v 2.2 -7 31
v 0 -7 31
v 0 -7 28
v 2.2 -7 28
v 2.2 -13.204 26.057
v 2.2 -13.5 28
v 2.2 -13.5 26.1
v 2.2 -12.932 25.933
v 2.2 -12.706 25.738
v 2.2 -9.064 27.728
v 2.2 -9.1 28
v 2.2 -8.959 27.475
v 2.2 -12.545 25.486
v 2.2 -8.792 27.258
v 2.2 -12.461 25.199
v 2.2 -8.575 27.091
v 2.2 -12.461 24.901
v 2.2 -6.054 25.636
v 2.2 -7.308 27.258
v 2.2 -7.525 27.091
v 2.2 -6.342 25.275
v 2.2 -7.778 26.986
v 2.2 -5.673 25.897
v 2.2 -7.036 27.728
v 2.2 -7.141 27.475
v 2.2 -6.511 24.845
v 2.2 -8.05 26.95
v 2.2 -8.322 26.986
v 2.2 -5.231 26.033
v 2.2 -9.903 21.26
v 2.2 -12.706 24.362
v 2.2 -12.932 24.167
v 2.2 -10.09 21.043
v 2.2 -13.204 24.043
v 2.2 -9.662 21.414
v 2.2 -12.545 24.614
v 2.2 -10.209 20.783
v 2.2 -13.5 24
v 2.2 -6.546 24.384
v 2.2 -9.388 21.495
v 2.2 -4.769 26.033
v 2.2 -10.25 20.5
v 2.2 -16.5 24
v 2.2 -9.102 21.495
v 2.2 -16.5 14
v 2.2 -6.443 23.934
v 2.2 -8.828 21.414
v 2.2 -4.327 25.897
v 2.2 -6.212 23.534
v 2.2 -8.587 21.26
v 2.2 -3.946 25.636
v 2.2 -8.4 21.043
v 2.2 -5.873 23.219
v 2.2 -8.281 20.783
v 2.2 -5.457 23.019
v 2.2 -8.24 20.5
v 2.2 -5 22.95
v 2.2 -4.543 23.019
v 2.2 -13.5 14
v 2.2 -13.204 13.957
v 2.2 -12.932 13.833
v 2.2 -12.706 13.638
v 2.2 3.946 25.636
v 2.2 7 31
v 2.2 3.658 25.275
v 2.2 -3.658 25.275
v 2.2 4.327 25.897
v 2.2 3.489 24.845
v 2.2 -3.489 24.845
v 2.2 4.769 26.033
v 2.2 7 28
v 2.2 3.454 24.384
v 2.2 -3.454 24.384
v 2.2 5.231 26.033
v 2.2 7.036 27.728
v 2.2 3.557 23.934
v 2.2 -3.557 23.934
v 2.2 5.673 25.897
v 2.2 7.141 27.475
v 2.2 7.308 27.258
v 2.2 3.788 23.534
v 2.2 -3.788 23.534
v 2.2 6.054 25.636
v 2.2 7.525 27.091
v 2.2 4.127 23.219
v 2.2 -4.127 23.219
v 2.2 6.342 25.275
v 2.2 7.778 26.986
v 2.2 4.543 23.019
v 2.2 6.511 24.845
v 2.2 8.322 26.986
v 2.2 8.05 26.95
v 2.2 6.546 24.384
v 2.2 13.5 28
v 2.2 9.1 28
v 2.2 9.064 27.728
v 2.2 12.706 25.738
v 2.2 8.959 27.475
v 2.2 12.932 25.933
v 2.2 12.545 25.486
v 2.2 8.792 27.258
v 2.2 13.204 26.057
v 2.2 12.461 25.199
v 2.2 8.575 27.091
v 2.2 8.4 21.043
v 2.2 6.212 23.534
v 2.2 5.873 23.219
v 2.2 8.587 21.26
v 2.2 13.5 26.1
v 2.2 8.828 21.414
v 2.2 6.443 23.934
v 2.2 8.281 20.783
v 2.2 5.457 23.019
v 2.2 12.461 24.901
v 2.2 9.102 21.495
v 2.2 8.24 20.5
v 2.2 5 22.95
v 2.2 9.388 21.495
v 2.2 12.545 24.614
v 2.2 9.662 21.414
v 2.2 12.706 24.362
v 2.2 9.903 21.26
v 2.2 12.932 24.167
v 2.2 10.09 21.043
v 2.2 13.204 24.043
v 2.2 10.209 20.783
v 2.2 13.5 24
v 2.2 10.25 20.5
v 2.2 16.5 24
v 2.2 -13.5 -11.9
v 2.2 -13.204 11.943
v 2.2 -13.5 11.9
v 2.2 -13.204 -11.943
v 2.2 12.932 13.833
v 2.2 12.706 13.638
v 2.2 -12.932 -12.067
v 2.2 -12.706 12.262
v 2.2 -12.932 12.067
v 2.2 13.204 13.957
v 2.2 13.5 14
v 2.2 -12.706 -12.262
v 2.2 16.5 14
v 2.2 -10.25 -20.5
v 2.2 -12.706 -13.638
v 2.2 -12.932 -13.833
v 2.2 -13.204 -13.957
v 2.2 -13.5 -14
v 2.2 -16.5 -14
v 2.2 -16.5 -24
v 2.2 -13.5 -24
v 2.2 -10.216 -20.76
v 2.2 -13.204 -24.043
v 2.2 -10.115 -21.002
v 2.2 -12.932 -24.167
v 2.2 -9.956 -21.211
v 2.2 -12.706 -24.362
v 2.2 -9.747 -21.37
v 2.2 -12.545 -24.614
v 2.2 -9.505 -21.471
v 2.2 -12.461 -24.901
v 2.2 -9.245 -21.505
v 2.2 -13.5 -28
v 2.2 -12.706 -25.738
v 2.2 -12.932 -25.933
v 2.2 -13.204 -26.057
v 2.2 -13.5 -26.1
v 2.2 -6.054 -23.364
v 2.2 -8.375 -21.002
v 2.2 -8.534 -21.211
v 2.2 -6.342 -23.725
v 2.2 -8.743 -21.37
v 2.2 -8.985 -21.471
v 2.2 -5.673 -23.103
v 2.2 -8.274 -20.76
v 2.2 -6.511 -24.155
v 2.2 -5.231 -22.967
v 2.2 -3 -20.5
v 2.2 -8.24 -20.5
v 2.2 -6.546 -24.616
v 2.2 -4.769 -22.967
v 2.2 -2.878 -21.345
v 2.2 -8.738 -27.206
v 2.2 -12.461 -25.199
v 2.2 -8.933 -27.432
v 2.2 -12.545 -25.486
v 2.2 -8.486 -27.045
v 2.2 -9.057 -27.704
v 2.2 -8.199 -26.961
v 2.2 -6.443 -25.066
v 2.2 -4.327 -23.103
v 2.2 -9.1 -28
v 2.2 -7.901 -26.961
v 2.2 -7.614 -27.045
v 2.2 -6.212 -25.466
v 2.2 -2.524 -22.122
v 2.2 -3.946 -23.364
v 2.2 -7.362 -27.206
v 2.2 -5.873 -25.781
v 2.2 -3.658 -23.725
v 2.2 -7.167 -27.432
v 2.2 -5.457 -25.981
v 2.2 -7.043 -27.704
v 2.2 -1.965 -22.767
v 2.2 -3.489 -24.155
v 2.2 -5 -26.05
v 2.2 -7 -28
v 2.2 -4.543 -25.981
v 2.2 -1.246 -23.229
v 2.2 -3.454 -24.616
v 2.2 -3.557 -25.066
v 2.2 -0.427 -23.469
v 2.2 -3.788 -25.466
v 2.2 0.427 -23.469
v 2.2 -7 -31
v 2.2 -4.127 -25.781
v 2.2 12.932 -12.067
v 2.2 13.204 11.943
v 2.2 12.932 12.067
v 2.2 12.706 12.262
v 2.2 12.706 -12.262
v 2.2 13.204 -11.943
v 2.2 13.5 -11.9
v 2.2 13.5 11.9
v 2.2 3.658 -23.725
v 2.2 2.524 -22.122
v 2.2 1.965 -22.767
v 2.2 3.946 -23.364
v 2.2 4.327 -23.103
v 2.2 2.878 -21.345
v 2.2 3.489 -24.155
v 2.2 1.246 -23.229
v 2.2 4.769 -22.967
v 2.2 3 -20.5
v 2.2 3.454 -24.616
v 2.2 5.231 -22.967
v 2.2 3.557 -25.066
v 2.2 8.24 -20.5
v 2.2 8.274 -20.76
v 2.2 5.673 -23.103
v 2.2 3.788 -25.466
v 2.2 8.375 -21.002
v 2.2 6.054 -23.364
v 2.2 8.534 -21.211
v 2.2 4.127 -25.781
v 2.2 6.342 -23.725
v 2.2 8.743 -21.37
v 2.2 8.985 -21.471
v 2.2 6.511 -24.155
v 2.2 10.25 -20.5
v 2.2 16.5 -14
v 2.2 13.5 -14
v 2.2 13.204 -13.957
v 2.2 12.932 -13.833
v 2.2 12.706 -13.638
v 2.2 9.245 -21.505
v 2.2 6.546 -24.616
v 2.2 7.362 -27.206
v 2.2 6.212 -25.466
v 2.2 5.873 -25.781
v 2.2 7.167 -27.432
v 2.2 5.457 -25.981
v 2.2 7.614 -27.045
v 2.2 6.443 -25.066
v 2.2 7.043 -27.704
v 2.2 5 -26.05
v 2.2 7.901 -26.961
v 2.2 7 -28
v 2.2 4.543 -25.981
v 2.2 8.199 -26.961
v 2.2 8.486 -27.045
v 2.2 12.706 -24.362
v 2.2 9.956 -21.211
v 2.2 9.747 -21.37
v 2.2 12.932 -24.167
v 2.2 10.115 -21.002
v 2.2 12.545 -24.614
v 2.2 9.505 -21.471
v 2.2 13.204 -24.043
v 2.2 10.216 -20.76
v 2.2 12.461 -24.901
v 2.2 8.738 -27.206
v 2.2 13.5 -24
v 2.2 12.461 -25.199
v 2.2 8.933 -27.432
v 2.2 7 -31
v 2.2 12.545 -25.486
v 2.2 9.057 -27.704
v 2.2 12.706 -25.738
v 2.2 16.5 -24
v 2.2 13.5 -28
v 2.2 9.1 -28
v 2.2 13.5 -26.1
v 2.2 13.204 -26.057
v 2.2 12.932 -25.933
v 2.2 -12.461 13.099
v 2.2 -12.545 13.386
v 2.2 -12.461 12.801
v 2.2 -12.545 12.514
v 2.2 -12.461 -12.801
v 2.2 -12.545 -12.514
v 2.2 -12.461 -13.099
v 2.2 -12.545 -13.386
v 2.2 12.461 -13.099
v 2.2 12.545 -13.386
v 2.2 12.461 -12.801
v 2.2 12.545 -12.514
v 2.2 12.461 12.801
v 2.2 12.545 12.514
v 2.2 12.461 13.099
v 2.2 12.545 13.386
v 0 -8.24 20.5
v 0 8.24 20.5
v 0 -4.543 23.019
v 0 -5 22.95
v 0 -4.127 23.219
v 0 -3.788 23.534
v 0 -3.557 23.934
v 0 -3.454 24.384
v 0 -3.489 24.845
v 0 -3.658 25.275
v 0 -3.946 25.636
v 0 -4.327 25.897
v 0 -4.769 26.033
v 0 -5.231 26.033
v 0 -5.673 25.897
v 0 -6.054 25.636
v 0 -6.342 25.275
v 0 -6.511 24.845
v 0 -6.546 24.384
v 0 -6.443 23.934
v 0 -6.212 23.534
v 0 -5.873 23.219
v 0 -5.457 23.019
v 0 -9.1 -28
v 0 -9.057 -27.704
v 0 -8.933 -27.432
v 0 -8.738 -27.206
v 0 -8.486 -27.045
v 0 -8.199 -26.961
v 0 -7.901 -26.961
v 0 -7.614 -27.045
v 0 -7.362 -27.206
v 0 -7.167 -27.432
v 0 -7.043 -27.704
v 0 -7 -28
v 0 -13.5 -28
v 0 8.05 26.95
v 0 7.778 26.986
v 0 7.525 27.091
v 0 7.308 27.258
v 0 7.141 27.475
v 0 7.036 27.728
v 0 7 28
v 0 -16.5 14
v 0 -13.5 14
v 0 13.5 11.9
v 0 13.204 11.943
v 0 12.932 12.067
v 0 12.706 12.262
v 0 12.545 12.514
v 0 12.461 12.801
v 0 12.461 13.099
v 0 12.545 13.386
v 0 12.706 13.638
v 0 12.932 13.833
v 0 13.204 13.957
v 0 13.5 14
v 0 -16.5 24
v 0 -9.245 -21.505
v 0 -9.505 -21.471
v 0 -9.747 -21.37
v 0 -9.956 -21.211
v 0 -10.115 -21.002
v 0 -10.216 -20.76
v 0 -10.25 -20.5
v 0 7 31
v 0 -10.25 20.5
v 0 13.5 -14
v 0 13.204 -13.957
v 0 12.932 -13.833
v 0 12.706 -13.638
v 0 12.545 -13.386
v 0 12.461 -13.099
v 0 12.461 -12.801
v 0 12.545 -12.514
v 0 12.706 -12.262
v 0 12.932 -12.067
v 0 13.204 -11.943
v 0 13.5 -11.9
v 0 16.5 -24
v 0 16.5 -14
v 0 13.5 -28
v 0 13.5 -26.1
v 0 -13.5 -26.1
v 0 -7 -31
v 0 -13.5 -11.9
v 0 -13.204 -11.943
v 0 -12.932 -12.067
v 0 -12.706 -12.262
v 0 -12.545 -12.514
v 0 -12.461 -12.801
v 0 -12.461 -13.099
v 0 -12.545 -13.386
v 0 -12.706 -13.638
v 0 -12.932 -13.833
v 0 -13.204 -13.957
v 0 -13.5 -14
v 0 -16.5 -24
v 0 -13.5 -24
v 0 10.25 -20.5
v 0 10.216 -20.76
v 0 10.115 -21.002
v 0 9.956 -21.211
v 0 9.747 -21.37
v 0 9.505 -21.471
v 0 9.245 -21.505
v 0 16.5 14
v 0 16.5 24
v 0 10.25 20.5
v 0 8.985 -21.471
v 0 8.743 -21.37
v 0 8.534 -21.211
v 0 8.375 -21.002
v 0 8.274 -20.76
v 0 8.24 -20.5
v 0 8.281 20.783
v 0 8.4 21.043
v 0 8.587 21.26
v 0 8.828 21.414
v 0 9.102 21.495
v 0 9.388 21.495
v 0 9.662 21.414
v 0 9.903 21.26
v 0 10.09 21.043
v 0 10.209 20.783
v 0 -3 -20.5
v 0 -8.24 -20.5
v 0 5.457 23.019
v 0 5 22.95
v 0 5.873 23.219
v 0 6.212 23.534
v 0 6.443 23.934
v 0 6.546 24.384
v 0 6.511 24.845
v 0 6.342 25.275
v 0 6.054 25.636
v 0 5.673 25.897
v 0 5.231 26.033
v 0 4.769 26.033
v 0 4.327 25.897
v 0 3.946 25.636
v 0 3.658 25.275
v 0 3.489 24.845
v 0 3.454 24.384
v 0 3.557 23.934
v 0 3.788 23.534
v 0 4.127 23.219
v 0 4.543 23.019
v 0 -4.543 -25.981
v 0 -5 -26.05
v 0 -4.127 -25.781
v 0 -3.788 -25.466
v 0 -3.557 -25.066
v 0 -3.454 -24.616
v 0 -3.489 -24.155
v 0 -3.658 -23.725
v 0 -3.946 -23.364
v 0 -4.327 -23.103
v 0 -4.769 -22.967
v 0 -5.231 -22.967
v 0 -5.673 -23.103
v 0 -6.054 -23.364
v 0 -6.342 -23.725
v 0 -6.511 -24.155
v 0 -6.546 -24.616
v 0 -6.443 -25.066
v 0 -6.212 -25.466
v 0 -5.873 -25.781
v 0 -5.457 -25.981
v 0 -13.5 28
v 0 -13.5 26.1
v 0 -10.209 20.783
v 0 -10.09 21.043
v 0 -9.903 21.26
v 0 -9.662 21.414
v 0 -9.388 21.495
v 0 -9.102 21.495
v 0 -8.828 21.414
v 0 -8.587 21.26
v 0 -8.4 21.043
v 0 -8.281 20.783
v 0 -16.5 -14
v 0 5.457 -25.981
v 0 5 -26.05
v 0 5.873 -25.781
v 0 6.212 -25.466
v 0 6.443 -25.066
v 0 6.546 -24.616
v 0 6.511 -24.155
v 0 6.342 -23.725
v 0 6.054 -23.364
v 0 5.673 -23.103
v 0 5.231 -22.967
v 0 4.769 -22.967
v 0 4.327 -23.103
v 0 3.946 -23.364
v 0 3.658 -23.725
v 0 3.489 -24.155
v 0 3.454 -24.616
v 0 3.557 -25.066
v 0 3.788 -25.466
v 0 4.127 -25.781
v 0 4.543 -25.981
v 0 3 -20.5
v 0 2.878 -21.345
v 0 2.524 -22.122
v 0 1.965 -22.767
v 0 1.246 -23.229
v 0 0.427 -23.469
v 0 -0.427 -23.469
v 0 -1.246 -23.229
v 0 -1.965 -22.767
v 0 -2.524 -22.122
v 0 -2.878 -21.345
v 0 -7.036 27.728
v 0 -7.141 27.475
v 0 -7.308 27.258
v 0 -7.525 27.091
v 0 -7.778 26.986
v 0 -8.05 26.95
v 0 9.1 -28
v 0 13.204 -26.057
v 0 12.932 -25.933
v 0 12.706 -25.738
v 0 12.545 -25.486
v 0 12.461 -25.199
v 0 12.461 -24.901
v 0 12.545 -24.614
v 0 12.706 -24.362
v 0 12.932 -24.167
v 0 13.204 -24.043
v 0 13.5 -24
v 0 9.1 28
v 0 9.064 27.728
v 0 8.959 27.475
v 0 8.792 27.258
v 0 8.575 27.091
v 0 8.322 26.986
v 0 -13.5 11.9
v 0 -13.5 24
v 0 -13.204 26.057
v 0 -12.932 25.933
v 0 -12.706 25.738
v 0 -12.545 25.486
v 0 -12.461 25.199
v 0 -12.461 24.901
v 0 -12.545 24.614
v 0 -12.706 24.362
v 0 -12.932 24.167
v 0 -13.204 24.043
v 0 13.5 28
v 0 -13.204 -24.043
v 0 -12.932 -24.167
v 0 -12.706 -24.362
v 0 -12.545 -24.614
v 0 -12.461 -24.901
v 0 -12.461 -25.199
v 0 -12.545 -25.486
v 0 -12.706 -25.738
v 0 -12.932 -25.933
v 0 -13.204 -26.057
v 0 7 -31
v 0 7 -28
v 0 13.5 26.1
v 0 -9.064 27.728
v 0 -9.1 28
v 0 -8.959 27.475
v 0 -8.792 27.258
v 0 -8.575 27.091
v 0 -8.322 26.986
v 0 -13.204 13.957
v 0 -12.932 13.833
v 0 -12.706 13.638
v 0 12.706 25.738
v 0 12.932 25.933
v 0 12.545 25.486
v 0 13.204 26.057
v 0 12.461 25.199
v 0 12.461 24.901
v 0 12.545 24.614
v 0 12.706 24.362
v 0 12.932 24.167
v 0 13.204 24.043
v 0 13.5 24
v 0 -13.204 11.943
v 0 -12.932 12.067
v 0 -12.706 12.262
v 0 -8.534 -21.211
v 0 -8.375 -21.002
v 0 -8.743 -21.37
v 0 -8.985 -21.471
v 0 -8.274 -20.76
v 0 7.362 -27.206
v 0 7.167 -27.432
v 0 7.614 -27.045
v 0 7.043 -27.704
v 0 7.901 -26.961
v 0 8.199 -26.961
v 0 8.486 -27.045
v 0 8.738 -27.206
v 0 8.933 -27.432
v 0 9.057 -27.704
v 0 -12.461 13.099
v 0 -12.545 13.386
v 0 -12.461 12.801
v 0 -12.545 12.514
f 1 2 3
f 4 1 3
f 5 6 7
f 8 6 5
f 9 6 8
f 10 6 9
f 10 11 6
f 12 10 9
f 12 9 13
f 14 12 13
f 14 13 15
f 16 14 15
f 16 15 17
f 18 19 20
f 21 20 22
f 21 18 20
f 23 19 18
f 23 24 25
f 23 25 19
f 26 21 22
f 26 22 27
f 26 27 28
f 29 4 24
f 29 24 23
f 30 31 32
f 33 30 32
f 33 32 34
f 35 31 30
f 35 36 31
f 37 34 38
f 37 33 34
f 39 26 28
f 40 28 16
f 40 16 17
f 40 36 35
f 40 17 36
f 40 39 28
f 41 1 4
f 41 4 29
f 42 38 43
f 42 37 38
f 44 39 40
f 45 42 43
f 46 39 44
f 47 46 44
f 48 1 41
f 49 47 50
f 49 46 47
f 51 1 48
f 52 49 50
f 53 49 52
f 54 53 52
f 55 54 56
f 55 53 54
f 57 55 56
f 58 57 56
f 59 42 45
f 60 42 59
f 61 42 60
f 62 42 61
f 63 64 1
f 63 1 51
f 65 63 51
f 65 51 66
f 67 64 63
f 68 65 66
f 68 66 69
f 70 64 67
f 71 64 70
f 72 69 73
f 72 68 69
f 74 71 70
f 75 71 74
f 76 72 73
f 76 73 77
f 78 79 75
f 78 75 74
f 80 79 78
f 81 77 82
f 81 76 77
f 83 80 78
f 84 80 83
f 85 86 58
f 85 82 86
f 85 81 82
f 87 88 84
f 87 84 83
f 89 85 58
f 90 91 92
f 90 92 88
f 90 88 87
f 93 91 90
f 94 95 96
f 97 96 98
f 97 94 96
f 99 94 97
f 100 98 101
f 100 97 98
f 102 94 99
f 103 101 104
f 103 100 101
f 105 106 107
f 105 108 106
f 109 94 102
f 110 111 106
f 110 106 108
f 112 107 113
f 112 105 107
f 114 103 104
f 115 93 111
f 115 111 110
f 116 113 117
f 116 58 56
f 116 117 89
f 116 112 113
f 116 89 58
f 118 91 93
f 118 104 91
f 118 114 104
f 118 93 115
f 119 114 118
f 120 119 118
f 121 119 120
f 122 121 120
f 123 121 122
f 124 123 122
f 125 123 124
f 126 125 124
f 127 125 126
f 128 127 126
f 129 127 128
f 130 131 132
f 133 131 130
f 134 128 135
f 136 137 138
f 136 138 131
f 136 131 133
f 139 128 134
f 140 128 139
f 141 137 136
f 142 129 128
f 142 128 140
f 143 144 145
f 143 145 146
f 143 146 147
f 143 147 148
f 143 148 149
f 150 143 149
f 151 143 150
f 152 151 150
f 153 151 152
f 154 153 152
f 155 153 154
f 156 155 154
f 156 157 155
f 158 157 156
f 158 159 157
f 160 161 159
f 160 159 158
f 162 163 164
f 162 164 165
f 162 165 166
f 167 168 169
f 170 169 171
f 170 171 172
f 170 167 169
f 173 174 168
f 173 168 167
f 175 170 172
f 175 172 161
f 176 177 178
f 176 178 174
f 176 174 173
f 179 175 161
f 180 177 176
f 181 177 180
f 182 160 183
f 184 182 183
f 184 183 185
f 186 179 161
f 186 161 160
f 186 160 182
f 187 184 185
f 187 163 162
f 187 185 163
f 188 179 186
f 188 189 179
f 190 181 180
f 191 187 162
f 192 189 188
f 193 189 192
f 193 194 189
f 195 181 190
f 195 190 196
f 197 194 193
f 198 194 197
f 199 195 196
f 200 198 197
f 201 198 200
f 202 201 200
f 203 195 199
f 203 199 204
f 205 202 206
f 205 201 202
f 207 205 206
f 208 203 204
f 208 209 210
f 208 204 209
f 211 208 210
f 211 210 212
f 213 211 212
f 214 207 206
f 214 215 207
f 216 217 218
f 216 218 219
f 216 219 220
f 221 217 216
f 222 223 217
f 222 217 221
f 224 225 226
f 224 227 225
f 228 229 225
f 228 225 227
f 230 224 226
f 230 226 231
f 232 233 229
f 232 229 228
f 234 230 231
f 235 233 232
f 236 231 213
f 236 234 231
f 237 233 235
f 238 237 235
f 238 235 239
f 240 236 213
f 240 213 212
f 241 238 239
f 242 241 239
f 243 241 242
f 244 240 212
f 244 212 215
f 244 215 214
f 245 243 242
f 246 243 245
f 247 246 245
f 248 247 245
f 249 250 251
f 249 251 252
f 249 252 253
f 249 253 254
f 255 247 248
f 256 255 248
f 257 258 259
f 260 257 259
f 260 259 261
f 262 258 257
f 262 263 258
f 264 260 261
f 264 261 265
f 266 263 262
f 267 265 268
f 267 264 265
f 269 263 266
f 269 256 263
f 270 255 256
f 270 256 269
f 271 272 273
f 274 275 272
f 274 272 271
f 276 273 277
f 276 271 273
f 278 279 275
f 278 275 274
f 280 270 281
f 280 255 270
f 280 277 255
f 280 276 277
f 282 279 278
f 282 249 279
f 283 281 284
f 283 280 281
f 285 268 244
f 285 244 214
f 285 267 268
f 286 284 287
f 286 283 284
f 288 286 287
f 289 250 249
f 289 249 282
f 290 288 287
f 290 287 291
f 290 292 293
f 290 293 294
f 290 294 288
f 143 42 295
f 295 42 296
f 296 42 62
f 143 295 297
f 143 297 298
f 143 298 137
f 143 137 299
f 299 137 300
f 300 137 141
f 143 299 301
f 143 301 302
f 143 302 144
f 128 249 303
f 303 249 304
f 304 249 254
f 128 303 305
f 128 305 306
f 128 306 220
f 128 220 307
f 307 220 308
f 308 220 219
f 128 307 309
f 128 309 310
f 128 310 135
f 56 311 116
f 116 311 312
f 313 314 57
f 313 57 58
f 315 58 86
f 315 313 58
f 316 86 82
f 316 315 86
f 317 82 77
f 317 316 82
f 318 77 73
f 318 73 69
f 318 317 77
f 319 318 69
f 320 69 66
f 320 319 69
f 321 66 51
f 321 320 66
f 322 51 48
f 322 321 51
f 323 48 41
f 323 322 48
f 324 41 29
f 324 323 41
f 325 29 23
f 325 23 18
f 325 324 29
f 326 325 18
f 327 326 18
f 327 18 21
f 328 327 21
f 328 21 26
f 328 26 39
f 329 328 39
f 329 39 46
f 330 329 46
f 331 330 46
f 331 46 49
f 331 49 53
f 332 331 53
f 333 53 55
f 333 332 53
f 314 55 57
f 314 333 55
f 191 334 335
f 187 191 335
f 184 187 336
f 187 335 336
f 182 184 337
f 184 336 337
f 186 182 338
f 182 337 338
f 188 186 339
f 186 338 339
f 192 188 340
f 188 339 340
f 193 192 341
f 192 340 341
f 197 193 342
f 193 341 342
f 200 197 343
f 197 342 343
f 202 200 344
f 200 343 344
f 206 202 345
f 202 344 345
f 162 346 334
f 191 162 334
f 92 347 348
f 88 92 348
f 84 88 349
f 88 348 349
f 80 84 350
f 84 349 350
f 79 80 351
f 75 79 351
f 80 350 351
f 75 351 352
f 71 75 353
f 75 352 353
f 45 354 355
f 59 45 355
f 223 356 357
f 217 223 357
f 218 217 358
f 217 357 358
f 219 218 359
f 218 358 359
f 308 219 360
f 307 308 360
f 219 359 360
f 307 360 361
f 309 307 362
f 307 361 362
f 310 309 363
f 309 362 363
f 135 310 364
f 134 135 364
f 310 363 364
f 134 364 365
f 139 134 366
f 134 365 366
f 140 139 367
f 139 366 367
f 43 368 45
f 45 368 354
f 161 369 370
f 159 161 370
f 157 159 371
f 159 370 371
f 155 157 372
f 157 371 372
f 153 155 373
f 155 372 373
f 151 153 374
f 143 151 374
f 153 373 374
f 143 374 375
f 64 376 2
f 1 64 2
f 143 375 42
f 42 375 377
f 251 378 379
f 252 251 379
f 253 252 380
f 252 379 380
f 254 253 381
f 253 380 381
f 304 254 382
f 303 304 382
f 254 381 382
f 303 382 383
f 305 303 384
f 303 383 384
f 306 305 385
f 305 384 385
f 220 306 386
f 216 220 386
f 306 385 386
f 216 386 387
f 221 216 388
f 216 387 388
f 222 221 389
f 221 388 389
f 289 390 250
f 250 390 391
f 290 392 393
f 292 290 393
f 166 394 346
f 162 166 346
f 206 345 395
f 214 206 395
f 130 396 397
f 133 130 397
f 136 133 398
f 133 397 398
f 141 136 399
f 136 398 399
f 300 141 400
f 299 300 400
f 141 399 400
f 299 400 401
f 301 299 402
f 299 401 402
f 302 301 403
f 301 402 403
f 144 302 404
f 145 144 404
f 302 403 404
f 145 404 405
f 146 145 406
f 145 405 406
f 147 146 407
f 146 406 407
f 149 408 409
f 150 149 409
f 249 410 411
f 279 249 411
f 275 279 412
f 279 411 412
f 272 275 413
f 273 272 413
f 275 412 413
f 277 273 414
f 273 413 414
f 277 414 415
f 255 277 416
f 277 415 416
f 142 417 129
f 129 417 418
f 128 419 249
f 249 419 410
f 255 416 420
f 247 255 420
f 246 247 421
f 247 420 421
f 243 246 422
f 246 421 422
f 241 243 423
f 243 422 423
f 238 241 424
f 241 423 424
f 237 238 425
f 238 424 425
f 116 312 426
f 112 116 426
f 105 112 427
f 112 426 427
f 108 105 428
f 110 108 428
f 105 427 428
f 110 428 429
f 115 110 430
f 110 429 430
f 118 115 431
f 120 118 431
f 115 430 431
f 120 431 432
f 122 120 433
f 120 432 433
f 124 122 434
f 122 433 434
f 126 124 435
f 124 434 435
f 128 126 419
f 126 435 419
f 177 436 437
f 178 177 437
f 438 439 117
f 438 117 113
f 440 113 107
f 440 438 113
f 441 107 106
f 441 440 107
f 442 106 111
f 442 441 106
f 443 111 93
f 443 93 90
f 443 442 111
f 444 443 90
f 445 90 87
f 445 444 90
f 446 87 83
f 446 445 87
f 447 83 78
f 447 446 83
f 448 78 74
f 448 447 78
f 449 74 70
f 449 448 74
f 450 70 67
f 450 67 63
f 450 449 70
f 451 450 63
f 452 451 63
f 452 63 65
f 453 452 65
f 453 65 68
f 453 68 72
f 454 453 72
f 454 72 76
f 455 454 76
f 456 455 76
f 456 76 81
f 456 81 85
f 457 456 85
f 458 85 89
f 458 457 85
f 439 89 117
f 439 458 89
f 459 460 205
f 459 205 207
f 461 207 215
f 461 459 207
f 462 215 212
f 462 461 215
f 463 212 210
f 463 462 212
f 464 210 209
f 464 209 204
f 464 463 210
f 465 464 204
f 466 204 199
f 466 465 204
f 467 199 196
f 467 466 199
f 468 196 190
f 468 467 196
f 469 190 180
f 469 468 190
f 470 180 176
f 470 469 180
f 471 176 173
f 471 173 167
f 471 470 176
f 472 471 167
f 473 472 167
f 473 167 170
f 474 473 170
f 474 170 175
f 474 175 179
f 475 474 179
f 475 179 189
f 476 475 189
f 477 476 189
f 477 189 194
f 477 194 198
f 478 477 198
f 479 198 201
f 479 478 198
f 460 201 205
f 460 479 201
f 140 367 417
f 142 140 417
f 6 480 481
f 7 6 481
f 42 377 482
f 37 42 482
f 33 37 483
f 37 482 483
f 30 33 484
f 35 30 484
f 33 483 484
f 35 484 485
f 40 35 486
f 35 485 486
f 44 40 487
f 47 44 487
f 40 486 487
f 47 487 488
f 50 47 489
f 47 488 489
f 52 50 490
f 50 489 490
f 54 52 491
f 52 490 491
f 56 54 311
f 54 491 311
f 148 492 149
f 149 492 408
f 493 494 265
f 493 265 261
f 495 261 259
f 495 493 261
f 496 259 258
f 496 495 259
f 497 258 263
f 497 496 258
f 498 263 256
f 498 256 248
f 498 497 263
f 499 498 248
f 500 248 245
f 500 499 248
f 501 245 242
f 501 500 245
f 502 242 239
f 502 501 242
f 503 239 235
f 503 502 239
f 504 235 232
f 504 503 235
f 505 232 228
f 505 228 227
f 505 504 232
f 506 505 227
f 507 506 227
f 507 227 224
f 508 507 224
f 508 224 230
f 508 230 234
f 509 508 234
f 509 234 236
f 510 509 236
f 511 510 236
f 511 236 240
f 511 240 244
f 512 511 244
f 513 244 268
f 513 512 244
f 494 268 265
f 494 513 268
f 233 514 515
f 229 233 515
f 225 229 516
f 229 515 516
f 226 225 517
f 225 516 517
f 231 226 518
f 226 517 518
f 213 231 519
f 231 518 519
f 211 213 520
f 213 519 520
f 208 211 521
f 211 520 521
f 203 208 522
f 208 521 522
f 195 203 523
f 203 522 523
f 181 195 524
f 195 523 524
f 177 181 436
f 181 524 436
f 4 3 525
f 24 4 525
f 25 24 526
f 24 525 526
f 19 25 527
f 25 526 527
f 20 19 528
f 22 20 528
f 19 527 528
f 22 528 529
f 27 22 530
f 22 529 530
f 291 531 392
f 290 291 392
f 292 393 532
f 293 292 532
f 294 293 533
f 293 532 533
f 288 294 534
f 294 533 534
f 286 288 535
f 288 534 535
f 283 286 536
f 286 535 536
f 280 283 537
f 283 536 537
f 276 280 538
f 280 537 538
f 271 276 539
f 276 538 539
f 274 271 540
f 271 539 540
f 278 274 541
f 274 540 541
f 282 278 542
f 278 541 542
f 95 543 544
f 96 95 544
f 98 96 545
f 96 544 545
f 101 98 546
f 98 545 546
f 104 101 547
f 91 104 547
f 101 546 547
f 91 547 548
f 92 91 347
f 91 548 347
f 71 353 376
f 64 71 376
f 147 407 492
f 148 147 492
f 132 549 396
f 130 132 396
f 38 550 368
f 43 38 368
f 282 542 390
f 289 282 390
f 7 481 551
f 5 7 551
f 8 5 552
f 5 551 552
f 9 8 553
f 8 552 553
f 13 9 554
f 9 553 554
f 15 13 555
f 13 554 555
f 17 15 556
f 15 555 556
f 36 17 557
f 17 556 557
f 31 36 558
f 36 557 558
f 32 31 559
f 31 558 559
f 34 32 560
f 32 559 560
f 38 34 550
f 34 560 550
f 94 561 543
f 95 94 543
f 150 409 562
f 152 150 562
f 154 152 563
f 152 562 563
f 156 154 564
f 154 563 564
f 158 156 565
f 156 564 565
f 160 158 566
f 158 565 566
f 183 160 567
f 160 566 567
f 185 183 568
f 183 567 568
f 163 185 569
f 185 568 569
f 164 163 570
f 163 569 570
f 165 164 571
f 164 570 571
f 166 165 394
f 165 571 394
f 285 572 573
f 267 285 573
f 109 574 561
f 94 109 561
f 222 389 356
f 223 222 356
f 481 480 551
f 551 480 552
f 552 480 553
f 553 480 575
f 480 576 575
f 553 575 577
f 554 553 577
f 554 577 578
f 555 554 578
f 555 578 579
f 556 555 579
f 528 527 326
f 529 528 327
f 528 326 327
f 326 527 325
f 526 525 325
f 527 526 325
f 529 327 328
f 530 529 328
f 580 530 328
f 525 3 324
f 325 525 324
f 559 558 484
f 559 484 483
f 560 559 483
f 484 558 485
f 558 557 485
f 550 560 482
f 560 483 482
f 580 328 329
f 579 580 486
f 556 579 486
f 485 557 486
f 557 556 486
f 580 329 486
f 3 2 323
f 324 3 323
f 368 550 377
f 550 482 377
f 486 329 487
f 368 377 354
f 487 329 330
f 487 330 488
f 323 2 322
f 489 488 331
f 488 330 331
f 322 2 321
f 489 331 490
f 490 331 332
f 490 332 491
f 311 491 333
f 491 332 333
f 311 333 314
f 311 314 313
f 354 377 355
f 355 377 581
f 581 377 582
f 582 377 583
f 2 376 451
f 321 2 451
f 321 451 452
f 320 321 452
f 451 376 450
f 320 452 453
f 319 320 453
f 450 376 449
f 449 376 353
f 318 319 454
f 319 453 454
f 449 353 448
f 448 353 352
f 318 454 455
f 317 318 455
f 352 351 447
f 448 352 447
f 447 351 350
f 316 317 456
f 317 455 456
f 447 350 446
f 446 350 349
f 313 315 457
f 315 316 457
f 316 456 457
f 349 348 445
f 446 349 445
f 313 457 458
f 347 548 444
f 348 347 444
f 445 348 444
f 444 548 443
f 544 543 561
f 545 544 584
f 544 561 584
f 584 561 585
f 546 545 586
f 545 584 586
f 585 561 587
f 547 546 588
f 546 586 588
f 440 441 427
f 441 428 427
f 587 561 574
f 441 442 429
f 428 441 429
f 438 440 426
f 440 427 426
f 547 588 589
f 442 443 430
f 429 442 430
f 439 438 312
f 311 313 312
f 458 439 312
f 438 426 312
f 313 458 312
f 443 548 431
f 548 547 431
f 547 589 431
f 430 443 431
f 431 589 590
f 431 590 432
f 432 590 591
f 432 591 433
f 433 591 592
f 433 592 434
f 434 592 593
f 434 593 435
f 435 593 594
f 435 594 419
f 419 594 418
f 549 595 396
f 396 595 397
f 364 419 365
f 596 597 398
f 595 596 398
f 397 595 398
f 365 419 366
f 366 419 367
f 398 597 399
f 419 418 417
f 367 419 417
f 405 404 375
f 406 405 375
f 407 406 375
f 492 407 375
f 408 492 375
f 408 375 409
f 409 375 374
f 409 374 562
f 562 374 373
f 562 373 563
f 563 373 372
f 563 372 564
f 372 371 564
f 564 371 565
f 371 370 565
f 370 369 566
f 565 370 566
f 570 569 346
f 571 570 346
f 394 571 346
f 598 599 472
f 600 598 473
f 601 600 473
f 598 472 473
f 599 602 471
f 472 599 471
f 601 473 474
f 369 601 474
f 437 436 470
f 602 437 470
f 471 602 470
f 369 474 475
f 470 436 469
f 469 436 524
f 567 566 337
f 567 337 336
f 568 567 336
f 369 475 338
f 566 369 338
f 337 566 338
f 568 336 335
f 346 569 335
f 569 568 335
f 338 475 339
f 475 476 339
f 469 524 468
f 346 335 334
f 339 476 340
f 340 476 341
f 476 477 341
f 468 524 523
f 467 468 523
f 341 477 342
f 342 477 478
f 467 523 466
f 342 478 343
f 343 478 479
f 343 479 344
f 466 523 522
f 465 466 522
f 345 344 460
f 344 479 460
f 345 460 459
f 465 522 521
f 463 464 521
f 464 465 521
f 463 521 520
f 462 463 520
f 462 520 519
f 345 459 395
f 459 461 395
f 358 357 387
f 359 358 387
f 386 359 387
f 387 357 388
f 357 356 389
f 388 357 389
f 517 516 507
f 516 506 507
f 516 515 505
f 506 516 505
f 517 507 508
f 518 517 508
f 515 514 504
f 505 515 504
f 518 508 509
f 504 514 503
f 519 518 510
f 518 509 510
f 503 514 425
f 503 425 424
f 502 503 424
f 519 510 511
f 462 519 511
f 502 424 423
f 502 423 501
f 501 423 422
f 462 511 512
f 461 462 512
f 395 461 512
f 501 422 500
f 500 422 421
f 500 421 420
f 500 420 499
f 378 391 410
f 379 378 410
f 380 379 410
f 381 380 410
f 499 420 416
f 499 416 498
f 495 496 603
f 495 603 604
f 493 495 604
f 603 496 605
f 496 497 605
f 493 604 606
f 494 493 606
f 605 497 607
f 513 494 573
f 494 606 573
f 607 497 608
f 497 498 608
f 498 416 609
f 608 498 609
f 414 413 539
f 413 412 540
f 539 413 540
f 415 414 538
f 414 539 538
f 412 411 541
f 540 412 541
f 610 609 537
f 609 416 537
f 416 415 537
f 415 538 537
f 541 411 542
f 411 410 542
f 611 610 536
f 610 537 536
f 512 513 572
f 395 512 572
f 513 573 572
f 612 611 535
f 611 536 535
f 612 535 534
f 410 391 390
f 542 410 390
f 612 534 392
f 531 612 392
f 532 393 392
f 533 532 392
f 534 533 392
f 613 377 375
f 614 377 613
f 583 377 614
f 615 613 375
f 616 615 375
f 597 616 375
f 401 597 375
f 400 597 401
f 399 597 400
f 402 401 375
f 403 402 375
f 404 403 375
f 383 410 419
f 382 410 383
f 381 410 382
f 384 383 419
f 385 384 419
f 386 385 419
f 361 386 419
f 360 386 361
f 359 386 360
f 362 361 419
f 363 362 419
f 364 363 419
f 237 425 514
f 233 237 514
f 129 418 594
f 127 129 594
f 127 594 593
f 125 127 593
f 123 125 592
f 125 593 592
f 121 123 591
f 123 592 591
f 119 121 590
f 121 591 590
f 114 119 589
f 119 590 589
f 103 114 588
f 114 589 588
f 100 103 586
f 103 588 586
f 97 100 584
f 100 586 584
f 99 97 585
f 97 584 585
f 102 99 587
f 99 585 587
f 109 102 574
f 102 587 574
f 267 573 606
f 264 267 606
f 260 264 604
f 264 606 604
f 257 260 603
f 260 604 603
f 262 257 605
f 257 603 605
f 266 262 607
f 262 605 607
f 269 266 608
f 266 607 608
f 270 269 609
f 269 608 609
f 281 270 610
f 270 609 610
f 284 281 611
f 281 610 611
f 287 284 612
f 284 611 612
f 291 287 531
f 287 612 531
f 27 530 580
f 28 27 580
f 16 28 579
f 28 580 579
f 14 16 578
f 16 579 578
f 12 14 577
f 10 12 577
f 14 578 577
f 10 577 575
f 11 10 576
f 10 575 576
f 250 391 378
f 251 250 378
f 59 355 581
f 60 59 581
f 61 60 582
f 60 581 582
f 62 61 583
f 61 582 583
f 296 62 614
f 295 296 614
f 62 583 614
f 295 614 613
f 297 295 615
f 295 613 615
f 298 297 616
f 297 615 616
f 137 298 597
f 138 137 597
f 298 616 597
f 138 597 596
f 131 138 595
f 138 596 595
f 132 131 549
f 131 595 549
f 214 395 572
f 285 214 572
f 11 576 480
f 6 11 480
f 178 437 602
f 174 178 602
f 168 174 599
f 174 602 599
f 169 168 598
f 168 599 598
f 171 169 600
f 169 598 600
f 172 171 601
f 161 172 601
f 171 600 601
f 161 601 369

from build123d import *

# Parameters (mm, degrees)
SKETCH_1_R      = 1.55
EXTRUDE_1_DEPTH = 2.2


with BuildPart() as part:
    # 草图1 → 凸台-拉伸1 (new body)
    with BuildSketch(Plane(origin=(0, 0, 0), x_dir=(0, 0, -1), z_dir=(1, 0, 0))):
        with BuildLine():
            Line((-24, 16.5), (-24, 13.5))
            ThreePointArc((-24, 13.5), (-25.05, 12.45), (-26.1, 13.5))
            Line((-26.1, 13.5), (-28, 13.5))
            Line((-28, 13.5), (-28, 9.1))
            ThreePointArc((-28, 9.1), (-27.25753788, 8.79246212), (-26.95, 8.05))
            ThreePointArc((-26.95, 8.05), (-27.25753788, 7.30753788), (-28, 7))
            Line((-28, 7), (-31, 7))
            Line((-31, 7), (-31, -7))
            Line((-31, -7), (-28, -7))
            ThreePointArc((-28, -7), (-27.25753788, -7.30753788), (-26.95, -8.05))
            ThreePointArc((-26.95, -8.05), (-27.25753788, -8.79246212), (-28, -9.1))
            Line((-28, -9.1), (-28, -13.5))
            Line((-28, -13.5), (-26.1, -13.5))
            ThreePointArc((-26.1, -13.5), (-25.05, -12.45), (-24, -13.5))
            Line((-24, -13.5), (-24, -16.5))
            Line((-24, -16.5), (-14, -16.5))
            Line((-14, -16.5), (-14, -13.5))
            ThreePointArc((-14, -13.5), (-12.95, -12.45), (-11.9, -13.5))
            Line((-11.9, -13.5), (11.9, -13.5))
            ThreePointArc((11.9, -13.5), (12.95, -12.45), (14, -13.5))
            Line((14, -13.5), (14, -16.5))
            Line((14, -16.5), (24, -16.5))
            Line((24, -16.5), (24, -13.5))
            ThreePointArc((24, -13.5), (25.05, -12.45), (26.1, -13.5))
            Line((26.1, -13.5), (28, -13.5))
            Line((28, -13.5), (28, -9.1))
            ThreePointArc((28, -9.1), (26.95, -8.05), (28, -7))
            Line((28, -7), (31, -7))
            Line((31, -7), (31, 7))
            Line((31, 7), (28, 7))
            ThreePointArc((28, 7), (26.95, 8.05), (28, 9.1))
            Line((28, 9.1), (28, 13.5))
            Line((28, 13.5), (26.1, 13.5))
            ThreePointArc((26.1, 13.5), (25.05, 12.45), (24, 13.5))
            Line((24, 13.5), (24, 16.5))
            Line((24, 16.5), (14, 16.5))
            Line((14, 16.5), (14, 13.5))
            ThreePointArc((14, 13.5), (12.95, 12.45), (11.9, 13.5))
            Line((11.9, 13.5), (-11.9, 13.5))
            ThreePointArc((-11.9, 13.5), (-12.95, 12.45), (-14, 13.5))
            Line((-14, 13.5), (-14, 16.5))
            Line((-14, 16.5), (-24, 16.5))
        make_face()
        with Locations((-24.5, -5)):
            Circle(SKETCH_1_R, mode=Mode.SUBTRACT)
        with BuildLine():
            Line((20.5, 8.24), (20.5, 3))
            ThreePointArc((20.5, 3), (23.5, 0), (20.5, -3))
            Line((20.5, -3), (20.5, -8.24))
            ThreePointArc((20.5, -8.24), (21.210642315, -8.534357685), (21.505, -9.245))
            ThreePointArc((21.505, -9.245), (21.210642315, -9.955642315), (20.5, -10.25))
            Line((20.5, -10.25), (-20.5, -10.25))
            ThreePointArc((-20.5, -10.25), (-21.505, -9.245), (-20.5, -8.24))
            Line((-20.5, -8.24), (-20.5, 8.24))
            ThreePointArc((-20.5, 8.24), (-21.505, 9.245), (-20.5, 10.25))
            Line((-20.5, 10.25), (20.5, 10.25))
            ThreePointArc((20.5, 10.25), (21.210642315, 9.955642315), (21.505, 9.245))
            ThreePointArc((21.505, 9.245), (21.210642315, 8.534357685), (20.5, 8.24))
        make_face(mode=Mode.SUBTRACT)
        with Locations((24.5, -5)):
            Circle(SKETCH_1_R, mode=Mode.SUBTRACT)
        with Locations((-24.5, 5)):
            Circle(SKETCH_1_R, mode=Mode.SUBTRACT)
        with Locations((24.5, 5)):
            Circle(SKETCH_1_R, mode=Mode.SUBTRACT)
    extrude(amount=EXTRUDE_1_DEPTH)


solid = part.part
